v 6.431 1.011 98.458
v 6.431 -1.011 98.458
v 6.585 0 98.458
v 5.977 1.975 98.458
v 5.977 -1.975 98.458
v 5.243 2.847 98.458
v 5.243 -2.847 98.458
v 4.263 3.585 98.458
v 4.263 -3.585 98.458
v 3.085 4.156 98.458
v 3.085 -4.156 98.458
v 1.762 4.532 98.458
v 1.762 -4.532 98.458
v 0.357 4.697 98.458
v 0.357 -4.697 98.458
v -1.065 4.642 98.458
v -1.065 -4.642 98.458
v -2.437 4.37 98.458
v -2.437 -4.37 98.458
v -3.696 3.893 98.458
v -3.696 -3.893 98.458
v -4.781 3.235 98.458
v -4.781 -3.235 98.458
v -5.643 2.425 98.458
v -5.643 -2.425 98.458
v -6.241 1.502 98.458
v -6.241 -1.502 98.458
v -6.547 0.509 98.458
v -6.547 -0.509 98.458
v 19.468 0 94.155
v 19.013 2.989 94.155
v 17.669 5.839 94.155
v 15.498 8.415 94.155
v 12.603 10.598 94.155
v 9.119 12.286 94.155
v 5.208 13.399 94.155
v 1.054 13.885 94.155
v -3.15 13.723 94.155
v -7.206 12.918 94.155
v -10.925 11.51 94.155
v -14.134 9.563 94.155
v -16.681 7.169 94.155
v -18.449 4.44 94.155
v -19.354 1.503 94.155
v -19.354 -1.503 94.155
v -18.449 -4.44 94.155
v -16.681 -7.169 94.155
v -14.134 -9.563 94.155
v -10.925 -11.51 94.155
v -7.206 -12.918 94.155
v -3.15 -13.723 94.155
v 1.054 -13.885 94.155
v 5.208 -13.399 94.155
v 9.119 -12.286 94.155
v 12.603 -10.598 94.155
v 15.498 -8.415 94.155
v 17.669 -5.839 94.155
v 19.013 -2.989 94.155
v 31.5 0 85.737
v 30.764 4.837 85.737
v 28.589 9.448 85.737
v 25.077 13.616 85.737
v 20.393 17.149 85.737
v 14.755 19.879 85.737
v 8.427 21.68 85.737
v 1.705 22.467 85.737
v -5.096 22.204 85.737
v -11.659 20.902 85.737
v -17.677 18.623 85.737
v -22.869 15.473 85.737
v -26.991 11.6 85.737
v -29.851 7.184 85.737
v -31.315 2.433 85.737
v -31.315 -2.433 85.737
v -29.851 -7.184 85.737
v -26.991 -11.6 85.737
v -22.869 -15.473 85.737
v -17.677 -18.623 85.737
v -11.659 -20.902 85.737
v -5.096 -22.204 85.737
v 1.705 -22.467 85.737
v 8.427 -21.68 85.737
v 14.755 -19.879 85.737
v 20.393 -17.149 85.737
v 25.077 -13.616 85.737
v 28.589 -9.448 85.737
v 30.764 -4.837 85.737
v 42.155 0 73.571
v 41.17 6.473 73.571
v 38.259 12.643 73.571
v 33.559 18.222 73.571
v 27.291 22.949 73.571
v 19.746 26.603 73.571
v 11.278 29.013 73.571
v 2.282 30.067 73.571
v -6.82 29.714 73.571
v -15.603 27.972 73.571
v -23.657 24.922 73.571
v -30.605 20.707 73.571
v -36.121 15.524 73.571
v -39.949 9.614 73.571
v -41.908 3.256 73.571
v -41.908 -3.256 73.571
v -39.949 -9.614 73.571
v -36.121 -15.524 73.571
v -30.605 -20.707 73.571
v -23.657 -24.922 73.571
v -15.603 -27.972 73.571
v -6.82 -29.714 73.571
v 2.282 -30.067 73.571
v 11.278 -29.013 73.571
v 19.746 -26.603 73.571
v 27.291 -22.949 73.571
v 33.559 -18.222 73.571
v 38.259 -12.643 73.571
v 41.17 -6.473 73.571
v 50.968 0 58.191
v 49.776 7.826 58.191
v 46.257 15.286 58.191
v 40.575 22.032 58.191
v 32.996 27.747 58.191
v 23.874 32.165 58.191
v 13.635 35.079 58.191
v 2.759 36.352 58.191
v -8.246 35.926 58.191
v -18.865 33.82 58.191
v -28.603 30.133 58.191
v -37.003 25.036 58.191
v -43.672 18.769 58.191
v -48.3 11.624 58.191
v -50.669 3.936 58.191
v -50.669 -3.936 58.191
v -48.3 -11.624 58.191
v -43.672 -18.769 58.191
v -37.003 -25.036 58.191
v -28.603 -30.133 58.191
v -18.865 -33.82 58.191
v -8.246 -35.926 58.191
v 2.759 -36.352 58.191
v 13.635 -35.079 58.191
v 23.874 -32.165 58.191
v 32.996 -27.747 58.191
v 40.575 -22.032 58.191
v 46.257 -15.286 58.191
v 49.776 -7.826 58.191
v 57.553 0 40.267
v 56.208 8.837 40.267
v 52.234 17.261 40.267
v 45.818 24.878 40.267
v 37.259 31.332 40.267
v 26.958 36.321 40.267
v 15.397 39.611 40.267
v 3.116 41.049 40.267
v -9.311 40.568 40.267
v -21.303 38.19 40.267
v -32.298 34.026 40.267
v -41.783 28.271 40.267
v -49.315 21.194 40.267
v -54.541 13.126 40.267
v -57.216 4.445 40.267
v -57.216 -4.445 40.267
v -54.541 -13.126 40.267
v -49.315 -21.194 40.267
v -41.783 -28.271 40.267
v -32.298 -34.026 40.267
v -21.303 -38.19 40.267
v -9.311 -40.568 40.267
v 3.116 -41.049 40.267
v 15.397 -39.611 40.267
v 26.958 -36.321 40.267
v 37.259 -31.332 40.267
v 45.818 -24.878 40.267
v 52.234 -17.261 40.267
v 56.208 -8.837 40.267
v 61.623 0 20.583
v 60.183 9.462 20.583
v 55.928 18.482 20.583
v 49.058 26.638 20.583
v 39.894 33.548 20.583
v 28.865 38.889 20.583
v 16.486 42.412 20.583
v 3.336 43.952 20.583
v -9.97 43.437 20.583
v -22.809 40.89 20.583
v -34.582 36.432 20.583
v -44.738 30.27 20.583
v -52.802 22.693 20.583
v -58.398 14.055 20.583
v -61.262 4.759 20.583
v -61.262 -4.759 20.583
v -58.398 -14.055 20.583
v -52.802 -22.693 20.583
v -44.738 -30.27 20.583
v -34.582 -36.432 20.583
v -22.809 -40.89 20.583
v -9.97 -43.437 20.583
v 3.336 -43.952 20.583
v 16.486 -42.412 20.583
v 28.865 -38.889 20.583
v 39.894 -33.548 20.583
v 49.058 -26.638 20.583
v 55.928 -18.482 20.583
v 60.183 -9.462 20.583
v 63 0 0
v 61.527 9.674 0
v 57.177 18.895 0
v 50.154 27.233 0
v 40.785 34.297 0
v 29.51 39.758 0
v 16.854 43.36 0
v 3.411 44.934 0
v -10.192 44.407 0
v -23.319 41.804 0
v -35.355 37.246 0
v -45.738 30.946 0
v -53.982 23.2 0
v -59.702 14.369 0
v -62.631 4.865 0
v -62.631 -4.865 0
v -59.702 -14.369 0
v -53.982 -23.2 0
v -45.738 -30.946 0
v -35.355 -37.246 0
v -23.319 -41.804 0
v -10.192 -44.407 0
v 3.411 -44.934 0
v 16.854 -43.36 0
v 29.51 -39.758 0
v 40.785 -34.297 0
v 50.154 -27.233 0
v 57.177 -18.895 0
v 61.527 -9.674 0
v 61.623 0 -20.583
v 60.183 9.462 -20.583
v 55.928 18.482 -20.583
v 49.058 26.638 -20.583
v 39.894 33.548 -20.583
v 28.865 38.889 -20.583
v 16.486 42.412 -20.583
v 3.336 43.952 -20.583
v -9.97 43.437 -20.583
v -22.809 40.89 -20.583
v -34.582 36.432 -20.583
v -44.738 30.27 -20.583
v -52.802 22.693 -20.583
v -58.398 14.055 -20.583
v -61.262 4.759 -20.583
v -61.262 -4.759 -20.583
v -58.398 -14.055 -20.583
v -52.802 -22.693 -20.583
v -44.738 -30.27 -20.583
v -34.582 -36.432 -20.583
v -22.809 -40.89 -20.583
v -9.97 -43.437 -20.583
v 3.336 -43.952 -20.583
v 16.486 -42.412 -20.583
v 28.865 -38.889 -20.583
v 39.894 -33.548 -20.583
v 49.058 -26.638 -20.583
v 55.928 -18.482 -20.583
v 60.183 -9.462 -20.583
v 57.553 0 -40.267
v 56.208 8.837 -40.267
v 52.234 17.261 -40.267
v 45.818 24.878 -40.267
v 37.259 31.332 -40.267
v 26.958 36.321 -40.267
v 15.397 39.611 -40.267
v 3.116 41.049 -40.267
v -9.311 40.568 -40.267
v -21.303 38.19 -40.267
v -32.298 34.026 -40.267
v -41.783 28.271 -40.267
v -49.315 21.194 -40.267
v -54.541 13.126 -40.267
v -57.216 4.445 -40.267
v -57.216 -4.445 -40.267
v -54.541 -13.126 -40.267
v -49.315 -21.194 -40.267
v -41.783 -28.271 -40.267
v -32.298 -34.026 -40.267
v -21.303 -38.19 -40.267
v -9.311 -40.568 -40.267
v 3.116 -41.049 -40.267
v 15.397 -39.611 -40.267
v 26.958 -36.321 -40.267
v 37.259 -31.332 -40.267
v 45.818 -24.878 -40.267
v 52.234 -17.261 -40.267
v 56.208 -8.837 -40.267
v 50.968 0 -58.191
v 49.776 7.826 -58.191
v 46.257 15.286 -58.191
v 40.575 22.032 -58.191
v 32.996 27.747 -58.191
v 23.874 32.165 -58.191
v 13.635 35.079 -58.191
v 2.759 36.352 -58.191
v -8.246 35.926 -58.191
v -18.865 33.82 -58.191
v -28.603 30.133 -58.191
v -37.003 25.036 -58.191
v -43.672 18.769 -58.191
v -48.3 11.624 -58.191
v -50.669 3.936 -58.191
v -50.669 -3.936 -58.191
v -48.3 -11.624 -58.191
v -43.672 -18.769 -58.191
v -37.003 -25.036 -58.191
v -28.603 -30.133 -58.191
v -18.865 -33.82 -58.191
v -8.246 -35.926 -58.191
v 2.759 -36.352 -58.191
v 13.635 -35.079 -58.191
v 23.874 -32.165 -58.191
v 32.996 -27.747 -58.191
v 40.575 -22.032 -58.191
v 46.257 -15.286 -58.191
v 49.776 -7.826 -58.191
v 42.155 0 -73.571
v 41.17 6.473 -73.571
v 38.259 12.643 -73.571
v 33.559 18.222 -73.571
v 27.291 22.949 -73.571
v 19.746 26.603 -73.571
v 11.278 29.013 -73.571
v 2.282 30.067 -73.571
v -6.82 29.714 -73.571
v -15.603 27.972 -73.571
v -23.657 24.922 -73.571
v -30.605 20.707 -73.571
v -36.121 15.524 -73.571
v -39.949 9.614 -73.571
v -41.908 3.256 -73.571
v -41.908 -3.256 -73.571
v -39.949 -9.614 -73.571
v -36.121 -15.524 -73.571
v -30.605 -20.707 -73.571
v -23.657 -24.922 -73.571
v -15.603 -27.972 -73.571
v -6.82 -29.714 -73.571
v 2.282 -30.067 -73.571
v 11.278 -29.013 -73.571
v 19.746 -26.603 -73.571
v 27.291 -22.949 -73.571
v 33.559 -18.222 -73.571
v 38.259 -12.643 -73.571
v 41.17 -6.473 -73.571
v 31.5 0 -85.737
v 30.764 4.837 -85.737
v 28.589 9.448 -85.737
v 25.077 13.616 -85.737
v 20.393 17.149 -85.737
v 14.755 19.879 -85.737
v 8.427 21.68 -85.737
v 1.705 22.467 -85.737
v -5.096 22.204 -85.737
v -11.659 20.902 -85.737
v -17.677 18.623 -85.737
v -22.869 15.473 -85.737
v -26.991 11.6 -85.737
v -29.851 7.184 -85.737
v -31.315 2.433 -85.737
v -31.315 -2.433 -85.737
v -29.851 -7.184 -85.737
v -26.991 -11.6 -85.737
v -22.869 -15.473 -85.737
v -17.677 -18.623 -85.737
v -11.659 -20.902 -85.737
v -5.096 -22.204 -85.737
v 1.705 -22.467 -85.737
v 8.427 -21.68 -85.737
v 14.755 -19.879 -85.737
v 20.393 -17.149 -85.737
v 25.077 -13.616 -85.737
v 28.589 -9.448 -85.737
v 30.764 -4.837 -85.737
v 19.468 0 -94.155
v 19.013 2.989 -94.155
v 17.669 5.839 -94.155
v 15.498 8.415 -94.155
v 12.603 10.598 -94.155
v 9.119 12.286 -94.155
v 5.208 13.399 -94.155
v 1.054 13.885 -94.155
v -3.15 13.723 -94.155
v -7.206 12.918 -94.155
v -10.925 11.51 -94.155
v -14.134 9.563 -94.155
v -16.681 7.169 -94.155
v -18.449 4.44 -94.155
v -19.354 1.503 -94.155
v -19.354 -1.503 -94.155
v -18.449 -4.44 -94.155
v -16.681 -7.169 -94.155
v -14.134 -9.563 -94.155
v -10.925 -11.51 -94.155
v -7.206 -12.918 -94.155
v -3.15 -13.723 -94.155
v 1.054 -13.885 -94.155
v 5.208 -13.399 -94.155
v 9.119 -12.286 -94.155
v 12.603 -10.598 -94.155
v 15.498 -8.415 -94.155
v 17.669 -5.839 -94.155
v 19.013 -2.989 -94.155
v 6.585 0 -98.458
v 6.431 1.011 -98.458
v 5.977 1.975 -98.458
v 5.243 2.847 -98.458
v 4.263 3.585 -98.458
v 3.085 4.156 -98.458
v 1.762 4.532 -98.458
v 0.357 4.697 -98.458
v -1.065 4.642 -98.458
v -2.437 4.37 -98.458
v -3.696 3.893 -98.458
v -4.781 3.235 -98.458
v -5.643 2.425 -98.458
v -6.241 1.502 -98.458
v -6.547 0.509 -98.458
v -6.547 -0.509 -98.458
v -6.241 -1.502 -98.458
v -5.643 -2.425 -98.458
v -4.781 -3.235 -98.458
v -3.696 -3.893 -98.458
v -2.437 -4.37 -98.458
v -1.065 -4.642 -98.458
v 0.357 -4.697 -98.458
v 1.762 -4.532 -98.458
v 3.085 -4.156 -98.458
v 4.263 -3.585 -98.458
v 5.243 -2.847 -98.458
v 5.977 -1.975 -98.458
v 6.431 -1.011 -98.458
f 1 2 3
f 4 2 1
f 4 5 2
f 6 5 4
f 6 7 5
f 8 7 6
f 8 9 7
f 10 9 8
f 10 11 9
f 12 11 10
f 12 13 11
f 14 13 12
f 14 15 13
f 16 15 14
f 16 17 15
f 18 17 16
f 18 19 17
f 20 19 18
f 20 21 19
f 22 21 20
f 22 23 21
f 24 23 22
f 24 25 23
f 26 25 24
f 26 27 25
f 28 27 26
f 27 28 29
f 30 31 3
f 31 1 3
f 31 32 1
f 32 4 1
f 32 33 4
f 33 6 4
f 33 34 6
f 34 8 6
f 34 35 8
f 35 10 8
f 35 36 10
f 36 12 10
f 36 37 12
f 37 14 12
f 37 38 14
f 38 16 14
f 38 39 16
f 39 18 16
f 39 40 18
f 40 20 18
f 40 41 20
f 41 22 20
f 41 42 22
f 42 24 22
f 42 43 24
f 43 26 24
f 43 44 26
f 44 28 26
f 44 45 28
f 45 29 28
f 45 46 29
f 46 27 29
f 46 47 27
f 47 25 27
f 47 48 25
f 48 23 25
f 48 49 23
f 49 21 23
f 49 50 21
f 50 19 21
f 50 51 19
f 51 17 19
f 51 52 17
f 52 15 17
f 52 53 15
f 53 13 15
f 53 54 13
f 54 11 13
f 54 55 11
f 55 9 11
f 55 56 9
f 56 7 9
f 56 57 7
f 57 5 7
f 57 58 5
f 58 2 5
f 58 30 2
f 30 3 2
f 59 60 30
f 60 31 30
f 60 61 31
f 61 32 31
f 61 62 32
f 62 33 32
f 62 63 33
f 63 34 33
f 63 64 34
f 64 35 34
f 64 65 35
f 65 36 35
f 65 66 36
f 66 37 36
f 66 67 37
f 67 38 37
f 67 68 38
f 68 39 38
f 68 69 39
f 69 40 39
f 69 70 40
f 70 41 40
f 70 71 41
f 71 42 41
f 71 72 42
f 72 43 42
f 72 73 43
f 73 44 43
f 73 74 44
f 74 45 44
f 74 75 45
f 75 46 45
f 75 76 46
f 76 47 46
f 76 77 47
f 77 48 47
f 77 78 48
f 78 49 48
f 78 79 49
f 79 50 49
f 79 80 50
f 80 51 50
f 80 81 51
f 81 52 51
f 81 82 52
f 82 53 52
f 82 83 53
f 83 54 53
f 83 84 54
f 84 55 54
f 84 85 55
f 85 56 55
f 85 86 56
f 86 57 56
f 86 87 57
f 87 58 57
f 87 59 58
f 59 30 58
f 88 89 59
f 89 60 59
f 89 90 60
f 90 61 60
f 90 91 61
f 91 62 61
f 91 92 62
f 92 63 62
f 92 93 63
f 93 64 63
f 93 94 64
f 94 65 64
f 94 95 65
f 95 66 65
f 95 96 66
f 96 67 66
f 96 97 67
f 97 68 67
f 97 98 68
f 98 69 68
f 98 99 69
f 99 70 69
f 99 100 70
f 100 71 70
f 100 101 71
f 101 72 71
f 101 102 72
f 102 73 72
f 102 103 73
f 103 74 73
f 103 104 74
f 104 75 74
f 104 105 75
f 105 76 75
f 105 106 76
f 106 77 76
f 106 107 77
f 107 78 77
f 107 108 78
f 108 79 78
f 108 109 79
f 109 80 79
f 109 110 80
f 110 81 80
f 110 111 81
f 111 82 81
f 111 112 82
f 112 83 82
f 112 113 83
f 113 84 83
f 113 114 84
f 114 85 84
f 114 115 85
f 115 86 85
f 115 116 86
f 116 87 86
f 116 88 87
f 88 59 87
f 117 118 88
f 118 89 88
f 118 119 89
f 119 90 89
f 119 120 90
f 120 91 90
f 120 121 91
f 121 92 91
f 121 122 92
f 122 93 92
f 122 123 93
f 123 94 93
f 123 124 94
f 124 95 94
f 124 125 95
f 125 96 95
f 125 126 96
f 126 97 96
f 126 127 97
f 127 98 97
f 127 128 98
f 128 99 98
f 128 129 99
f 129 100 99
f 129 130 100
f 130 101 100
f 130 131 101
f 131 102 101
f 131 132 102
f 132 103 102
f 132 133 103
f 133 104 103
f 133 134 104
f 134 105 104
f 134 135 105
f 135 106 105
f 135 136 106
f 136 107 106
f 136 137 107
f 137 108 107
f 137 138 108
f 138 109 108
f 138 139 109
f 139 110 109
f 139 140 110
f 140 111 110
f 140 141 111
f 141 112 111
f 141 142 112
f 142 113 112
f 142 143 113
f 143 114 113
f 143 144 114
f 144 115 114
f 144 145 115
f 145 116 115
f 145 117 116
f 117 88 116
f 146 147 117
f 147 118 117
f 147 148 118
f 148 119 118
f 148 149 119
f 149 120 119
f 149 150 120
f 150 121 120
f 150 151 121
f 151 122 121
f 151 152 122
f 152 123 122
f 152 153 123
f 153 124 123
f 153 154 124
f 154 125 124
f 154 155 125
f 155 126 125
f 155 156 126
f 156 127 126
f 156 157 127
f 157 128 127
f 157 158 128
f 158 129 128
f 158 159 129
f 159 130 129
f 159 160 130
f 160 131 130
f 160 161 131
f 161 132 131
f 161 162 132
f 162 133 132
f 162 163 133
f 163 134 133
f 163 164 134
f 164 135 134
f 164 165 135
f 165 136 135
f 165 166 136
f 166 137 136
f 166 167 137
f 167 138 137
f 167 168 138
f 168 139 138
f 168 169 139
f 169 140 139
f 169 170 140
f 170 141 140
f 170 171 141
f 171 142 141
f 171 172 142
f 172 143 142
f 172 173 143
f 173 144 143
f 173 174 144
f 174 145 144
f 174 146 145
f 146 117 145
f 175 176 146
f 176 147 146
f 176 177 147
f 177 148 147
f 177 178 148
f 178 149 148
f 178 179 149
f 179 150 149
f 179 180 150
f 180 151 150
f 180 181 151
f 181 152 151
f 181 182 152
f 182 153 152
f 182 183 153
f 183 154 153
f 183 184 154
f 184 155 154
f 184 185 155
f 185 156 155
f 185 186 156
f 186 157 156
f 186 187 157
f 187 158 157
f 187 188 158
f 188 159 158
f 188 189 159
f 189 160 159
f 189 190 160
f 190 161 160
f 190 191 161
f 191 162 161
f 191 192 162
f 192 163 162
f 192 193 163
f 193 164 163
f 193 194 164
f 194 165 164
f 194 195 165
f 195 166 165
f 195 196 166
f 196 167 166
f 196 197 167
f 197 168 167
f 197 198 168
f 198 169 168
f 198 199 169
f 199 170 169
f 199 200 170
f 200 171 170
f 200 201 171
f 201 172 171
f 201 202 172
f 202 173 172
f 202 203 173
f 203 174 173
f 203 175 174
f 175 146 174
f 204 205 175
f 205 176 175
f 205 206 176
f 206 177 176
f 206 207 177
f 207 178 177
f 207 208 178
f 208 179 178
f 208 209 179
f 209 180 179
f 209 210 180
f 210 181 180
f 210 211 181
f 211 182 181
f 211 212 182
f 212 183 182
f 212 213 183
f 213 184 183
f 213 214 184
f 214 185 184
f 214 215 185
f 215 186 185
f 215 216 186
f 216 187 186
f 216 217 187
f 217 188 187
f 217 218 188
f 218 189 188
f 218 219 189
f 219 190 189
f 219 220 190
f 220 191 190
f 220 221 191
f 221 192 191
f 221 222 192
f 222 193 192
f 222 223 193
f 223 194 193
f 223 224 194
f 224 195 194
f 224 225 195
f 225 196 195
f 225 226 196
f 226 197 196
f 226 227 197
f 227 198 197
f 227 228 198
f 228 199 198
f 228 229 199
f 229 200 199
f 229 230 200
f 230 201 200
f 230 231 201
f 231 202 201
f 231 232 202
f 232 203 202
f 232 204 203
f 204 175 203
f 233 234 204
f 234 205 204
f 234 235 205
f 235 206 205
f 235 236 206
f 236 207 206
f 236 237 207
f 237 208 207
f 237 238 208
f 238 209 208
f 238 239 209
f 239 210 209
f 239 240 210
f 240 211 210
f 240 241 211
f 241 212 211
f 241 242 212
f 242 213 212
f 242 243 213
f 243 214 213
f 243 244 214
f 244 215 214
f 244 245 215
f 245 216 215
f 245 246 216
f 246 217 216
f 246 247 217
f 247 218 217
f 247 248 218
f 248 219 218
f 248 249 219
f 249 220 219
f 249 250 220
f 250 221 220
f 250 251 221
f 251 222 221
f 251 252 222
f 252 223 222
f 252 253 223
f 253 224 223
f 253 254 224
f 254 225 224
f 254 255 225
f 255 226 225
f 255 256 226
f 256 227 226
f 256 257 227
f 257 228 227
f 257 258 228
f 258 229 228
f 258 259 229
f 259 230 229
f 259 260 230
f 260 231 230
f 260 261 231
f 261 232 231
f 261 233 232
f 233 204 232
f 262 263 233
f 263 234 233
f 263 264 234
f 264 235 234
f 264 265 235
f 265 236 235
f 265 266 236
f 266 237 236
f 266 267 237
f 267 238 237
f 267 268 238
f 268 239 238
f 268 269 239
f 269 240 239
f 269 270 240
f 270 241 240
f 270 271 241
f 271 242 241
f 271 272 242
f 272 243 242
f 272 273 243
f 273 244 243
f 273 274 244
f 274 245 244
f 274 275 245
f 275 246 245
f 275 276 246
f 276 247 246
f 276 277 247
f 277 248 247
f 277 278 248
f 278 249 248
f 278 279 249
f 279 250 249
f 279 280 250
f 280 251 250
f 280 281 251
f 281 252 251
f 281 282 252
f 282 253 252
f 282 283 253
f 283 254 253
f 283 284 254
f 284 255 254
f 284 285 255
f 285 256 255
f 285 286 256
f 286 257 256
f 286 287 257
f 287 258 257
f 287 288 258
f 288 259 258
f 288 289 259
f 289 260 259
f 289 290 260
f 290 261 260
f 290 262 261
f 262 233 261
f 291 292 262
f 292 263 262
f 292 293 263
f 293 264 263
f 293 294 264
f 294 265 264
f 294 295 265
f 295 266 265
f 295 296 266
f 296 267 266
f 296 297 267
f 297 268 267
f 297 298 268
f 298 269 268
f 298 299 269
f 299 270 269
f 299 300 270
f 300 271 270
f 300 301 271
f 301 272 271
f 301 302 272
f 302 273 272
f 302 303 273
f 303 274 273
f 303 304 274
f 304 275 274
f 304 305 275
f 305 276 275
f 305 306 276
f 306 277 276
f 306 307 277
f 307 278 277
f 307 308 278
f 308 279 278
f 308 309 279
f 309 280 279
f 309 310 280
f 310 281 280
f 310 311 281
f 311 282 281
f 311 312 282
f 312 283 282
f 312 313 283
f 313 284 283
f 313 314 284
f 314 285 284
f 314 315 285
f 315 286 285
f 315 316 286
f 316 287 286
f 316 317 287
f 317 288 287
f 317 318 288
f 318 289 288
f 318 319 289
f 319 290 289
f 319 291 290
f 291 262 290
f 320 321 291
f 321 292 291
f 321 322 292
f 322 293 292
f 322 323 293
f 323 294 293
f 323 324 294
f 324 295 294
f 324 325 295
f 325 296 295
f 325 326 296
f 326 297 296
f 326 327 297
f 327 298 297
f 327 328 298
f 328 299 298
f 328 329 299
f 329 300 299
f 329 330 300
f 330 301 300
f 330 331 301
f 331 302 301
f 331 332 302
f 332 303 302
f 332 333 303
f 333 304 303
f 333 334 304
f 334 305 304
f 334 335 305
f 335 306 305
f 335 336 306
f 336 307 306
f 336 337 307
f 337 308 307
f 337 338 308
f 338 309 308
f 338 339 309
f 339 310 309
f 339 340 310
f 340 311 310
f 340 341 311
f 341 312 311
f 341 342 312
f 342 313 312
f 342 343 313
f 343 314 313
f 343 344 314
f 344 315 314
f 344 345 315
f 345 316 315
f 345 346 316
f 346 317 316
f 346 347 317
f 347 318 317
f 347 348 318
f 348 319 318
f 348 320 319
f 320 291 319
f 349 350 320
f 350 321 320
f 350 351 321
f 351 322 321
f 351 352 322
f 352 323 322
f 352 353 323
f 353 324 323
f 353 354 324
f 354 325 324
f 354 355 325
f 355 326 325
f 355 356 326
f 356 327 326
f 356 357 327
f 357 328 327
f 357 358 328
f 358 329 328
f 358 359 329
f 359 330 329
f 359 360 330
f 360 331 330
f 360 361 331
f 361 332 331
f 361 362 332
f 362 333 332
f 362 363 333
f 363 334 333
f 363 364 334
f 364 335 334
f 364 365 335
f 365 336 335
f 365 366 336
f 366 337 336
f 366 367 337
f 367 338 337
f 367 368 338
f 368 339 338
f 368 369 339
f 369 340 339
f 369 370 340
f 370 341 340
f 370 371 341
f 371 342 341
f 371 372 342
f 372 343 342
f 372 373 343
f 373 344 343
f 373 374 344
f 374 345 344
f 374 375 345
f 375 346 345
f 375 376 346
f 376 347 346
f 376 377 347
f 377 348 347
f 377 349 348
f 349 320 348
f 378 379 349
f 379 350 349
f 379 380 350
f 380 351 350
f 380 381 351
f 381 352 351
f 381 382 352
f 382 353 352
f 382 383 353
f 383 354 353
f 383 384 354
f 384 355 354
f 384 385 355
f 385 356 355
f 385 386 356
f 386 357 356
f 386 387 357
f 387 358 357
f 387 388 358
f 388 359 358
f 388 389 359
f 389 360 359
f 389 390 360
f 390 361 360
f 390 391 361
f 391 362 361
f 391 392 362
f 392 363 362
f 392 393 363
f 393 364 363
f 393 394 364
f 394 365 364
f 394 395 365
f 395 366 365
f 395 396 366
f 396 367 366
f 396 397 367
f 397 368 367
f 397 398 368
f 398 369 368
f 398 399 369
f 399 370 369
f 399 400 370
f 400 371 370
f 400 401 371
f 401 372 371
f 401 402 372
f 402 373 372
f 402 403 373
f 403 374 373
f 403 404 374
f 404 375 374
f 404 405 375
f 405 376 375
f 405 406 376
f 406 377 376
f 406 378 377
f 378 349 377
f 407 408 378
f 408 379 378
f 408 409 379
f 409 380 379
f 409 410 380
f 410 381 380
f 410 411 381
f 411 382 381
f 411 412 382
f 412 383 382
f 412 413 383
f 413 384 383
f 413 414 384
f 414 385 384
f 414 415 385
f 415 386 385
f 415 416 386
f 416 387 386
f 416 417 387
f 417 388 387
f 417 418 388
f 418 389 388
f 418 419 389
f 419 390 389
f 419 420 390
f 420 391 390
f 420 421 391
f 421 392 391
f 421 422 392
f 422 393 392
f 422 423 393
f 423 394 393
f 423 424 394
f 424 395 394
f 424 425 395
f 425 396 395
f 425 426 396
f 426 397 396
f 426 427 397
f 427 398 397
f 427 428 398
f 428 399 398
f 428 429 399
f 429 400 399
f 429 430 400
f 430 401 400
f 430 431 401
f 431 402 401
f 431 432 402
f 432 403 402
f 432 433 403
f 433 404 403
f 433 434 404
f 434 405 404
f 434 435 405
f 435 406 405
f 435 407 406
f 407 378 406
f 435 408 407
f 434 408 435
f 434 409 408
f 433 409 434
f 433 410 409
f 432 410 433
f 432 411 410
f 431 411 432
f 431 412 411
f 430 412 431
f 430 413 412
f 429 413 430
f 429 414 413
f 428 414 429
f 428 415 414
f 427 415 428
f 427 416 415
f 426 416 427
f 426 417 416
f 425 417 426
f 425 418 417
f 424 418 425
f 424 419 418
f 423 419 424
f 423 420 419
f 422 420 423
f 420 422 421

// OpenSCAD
// Generated by SolidPython 1.0.1 on 2020-07-29 00:46:47


scale(v = [7, 5, 11]) {
	sphere(r = 9);
}
/***********************************************
*********      SolidPython code:      **********
************************************************
 
# import packages: SolidPython
from solid import *
from solid.utils import *
from itertools import chain, combinations, permutations


class Resize:

    def __init__(self, scad_file):
        self.scad_file = scad_file
        #self.scad_file = import_scad(scad_file)
        # cone/cylinder param:
        self.r1 = 0
        self.r2 = 0
        self.h = 0
        # rectangular prism param:
        self.w = 0
        self.l = 0
        # ellipse param:
        self.r = 0

    # import OpenScad code (file name corresponds to shape)


    # classify shape + parameters
    def assign(self, param1, param2, param3):
        if self.scad_file == 'cone.scad':
            self.r1 = param1
            self.r2 = param2
            self.h = param3
        elif self.scad_file == 'cylinder.scad':
            self.r1 = param1
            self.r2 = param2
            self.h = param3
        elif self.scad_file == 'rectangularPrism.scad':
            self.h = param1
            self.l = param2
            self.w = param3
        else:
            self.r = param1
            self.h = param2

    # resize parameters
    def iterate(self):
        x = range(3, 20, 2)
        i = 1
        if self.scad_file == 'cone.scad':
            tempList = list(permutations(x, 2))
            for temp in tempList:
                param1 = temp[0]
                param2 = temp[1]
                filepath = 'produced_scad_files/' + 'cone' + str(param1) + '_' + str(param2) + '_' + '.scad'
                scad_render_to_file(cylinder(h=param1, r1=param2, r2=0), filepath)

        elif self.scad_file == 'cylinder.scad':
            tempList = list(permutations(x, 3))
            for temp in tempList:
                param1 = temp[0]
                param2 = temp[1]
                filepath = 'produced_scad_files/' + 'cylinder' + str(param1) + '_' + str(param2) + '_' + '.scad'
                scad_render_to_file(cylinder(h=param1, r1=param2, r2=param2), filepath)

        elif self.scad_file == 'rectangularPrism.scad':
            tempList = list(permutations(x, 3))
            for temp in tempList:
                param1 = temp[0]
                param2 = temp[1]
                param3 = temp[2]
                filepath = 'produced_scad_files/' + 'rectangularPrism' + str(param1) + '_' + str(param2) + '_' + str(
                    param3) + '.scad'
                scad_render_to_file(cube(size=(param1, param2, param3)), filepath)

        elif self.scad_file == 'ellipse.scad':
            tempList = list(permutations(x, 4))
            for temp in tempList:
                param1 = temp[0]
                param2 = temp[1]
                param3 = temp[2]
                param4 = temp[3]
                filepath = 'produced_scad_files/' + 'ellipse' + str(param1) + '_' + str(param2) + '_' + str(param3) + '_' + str(param4) + '.scad'
                scad_render_to_file(scale([param1, param2, param3])(sphere(r=param4)), filepath)

    def render_to_scadfile(self):
        scad_render_to_file(scad, 'example.scad') 
 
************************************************/
